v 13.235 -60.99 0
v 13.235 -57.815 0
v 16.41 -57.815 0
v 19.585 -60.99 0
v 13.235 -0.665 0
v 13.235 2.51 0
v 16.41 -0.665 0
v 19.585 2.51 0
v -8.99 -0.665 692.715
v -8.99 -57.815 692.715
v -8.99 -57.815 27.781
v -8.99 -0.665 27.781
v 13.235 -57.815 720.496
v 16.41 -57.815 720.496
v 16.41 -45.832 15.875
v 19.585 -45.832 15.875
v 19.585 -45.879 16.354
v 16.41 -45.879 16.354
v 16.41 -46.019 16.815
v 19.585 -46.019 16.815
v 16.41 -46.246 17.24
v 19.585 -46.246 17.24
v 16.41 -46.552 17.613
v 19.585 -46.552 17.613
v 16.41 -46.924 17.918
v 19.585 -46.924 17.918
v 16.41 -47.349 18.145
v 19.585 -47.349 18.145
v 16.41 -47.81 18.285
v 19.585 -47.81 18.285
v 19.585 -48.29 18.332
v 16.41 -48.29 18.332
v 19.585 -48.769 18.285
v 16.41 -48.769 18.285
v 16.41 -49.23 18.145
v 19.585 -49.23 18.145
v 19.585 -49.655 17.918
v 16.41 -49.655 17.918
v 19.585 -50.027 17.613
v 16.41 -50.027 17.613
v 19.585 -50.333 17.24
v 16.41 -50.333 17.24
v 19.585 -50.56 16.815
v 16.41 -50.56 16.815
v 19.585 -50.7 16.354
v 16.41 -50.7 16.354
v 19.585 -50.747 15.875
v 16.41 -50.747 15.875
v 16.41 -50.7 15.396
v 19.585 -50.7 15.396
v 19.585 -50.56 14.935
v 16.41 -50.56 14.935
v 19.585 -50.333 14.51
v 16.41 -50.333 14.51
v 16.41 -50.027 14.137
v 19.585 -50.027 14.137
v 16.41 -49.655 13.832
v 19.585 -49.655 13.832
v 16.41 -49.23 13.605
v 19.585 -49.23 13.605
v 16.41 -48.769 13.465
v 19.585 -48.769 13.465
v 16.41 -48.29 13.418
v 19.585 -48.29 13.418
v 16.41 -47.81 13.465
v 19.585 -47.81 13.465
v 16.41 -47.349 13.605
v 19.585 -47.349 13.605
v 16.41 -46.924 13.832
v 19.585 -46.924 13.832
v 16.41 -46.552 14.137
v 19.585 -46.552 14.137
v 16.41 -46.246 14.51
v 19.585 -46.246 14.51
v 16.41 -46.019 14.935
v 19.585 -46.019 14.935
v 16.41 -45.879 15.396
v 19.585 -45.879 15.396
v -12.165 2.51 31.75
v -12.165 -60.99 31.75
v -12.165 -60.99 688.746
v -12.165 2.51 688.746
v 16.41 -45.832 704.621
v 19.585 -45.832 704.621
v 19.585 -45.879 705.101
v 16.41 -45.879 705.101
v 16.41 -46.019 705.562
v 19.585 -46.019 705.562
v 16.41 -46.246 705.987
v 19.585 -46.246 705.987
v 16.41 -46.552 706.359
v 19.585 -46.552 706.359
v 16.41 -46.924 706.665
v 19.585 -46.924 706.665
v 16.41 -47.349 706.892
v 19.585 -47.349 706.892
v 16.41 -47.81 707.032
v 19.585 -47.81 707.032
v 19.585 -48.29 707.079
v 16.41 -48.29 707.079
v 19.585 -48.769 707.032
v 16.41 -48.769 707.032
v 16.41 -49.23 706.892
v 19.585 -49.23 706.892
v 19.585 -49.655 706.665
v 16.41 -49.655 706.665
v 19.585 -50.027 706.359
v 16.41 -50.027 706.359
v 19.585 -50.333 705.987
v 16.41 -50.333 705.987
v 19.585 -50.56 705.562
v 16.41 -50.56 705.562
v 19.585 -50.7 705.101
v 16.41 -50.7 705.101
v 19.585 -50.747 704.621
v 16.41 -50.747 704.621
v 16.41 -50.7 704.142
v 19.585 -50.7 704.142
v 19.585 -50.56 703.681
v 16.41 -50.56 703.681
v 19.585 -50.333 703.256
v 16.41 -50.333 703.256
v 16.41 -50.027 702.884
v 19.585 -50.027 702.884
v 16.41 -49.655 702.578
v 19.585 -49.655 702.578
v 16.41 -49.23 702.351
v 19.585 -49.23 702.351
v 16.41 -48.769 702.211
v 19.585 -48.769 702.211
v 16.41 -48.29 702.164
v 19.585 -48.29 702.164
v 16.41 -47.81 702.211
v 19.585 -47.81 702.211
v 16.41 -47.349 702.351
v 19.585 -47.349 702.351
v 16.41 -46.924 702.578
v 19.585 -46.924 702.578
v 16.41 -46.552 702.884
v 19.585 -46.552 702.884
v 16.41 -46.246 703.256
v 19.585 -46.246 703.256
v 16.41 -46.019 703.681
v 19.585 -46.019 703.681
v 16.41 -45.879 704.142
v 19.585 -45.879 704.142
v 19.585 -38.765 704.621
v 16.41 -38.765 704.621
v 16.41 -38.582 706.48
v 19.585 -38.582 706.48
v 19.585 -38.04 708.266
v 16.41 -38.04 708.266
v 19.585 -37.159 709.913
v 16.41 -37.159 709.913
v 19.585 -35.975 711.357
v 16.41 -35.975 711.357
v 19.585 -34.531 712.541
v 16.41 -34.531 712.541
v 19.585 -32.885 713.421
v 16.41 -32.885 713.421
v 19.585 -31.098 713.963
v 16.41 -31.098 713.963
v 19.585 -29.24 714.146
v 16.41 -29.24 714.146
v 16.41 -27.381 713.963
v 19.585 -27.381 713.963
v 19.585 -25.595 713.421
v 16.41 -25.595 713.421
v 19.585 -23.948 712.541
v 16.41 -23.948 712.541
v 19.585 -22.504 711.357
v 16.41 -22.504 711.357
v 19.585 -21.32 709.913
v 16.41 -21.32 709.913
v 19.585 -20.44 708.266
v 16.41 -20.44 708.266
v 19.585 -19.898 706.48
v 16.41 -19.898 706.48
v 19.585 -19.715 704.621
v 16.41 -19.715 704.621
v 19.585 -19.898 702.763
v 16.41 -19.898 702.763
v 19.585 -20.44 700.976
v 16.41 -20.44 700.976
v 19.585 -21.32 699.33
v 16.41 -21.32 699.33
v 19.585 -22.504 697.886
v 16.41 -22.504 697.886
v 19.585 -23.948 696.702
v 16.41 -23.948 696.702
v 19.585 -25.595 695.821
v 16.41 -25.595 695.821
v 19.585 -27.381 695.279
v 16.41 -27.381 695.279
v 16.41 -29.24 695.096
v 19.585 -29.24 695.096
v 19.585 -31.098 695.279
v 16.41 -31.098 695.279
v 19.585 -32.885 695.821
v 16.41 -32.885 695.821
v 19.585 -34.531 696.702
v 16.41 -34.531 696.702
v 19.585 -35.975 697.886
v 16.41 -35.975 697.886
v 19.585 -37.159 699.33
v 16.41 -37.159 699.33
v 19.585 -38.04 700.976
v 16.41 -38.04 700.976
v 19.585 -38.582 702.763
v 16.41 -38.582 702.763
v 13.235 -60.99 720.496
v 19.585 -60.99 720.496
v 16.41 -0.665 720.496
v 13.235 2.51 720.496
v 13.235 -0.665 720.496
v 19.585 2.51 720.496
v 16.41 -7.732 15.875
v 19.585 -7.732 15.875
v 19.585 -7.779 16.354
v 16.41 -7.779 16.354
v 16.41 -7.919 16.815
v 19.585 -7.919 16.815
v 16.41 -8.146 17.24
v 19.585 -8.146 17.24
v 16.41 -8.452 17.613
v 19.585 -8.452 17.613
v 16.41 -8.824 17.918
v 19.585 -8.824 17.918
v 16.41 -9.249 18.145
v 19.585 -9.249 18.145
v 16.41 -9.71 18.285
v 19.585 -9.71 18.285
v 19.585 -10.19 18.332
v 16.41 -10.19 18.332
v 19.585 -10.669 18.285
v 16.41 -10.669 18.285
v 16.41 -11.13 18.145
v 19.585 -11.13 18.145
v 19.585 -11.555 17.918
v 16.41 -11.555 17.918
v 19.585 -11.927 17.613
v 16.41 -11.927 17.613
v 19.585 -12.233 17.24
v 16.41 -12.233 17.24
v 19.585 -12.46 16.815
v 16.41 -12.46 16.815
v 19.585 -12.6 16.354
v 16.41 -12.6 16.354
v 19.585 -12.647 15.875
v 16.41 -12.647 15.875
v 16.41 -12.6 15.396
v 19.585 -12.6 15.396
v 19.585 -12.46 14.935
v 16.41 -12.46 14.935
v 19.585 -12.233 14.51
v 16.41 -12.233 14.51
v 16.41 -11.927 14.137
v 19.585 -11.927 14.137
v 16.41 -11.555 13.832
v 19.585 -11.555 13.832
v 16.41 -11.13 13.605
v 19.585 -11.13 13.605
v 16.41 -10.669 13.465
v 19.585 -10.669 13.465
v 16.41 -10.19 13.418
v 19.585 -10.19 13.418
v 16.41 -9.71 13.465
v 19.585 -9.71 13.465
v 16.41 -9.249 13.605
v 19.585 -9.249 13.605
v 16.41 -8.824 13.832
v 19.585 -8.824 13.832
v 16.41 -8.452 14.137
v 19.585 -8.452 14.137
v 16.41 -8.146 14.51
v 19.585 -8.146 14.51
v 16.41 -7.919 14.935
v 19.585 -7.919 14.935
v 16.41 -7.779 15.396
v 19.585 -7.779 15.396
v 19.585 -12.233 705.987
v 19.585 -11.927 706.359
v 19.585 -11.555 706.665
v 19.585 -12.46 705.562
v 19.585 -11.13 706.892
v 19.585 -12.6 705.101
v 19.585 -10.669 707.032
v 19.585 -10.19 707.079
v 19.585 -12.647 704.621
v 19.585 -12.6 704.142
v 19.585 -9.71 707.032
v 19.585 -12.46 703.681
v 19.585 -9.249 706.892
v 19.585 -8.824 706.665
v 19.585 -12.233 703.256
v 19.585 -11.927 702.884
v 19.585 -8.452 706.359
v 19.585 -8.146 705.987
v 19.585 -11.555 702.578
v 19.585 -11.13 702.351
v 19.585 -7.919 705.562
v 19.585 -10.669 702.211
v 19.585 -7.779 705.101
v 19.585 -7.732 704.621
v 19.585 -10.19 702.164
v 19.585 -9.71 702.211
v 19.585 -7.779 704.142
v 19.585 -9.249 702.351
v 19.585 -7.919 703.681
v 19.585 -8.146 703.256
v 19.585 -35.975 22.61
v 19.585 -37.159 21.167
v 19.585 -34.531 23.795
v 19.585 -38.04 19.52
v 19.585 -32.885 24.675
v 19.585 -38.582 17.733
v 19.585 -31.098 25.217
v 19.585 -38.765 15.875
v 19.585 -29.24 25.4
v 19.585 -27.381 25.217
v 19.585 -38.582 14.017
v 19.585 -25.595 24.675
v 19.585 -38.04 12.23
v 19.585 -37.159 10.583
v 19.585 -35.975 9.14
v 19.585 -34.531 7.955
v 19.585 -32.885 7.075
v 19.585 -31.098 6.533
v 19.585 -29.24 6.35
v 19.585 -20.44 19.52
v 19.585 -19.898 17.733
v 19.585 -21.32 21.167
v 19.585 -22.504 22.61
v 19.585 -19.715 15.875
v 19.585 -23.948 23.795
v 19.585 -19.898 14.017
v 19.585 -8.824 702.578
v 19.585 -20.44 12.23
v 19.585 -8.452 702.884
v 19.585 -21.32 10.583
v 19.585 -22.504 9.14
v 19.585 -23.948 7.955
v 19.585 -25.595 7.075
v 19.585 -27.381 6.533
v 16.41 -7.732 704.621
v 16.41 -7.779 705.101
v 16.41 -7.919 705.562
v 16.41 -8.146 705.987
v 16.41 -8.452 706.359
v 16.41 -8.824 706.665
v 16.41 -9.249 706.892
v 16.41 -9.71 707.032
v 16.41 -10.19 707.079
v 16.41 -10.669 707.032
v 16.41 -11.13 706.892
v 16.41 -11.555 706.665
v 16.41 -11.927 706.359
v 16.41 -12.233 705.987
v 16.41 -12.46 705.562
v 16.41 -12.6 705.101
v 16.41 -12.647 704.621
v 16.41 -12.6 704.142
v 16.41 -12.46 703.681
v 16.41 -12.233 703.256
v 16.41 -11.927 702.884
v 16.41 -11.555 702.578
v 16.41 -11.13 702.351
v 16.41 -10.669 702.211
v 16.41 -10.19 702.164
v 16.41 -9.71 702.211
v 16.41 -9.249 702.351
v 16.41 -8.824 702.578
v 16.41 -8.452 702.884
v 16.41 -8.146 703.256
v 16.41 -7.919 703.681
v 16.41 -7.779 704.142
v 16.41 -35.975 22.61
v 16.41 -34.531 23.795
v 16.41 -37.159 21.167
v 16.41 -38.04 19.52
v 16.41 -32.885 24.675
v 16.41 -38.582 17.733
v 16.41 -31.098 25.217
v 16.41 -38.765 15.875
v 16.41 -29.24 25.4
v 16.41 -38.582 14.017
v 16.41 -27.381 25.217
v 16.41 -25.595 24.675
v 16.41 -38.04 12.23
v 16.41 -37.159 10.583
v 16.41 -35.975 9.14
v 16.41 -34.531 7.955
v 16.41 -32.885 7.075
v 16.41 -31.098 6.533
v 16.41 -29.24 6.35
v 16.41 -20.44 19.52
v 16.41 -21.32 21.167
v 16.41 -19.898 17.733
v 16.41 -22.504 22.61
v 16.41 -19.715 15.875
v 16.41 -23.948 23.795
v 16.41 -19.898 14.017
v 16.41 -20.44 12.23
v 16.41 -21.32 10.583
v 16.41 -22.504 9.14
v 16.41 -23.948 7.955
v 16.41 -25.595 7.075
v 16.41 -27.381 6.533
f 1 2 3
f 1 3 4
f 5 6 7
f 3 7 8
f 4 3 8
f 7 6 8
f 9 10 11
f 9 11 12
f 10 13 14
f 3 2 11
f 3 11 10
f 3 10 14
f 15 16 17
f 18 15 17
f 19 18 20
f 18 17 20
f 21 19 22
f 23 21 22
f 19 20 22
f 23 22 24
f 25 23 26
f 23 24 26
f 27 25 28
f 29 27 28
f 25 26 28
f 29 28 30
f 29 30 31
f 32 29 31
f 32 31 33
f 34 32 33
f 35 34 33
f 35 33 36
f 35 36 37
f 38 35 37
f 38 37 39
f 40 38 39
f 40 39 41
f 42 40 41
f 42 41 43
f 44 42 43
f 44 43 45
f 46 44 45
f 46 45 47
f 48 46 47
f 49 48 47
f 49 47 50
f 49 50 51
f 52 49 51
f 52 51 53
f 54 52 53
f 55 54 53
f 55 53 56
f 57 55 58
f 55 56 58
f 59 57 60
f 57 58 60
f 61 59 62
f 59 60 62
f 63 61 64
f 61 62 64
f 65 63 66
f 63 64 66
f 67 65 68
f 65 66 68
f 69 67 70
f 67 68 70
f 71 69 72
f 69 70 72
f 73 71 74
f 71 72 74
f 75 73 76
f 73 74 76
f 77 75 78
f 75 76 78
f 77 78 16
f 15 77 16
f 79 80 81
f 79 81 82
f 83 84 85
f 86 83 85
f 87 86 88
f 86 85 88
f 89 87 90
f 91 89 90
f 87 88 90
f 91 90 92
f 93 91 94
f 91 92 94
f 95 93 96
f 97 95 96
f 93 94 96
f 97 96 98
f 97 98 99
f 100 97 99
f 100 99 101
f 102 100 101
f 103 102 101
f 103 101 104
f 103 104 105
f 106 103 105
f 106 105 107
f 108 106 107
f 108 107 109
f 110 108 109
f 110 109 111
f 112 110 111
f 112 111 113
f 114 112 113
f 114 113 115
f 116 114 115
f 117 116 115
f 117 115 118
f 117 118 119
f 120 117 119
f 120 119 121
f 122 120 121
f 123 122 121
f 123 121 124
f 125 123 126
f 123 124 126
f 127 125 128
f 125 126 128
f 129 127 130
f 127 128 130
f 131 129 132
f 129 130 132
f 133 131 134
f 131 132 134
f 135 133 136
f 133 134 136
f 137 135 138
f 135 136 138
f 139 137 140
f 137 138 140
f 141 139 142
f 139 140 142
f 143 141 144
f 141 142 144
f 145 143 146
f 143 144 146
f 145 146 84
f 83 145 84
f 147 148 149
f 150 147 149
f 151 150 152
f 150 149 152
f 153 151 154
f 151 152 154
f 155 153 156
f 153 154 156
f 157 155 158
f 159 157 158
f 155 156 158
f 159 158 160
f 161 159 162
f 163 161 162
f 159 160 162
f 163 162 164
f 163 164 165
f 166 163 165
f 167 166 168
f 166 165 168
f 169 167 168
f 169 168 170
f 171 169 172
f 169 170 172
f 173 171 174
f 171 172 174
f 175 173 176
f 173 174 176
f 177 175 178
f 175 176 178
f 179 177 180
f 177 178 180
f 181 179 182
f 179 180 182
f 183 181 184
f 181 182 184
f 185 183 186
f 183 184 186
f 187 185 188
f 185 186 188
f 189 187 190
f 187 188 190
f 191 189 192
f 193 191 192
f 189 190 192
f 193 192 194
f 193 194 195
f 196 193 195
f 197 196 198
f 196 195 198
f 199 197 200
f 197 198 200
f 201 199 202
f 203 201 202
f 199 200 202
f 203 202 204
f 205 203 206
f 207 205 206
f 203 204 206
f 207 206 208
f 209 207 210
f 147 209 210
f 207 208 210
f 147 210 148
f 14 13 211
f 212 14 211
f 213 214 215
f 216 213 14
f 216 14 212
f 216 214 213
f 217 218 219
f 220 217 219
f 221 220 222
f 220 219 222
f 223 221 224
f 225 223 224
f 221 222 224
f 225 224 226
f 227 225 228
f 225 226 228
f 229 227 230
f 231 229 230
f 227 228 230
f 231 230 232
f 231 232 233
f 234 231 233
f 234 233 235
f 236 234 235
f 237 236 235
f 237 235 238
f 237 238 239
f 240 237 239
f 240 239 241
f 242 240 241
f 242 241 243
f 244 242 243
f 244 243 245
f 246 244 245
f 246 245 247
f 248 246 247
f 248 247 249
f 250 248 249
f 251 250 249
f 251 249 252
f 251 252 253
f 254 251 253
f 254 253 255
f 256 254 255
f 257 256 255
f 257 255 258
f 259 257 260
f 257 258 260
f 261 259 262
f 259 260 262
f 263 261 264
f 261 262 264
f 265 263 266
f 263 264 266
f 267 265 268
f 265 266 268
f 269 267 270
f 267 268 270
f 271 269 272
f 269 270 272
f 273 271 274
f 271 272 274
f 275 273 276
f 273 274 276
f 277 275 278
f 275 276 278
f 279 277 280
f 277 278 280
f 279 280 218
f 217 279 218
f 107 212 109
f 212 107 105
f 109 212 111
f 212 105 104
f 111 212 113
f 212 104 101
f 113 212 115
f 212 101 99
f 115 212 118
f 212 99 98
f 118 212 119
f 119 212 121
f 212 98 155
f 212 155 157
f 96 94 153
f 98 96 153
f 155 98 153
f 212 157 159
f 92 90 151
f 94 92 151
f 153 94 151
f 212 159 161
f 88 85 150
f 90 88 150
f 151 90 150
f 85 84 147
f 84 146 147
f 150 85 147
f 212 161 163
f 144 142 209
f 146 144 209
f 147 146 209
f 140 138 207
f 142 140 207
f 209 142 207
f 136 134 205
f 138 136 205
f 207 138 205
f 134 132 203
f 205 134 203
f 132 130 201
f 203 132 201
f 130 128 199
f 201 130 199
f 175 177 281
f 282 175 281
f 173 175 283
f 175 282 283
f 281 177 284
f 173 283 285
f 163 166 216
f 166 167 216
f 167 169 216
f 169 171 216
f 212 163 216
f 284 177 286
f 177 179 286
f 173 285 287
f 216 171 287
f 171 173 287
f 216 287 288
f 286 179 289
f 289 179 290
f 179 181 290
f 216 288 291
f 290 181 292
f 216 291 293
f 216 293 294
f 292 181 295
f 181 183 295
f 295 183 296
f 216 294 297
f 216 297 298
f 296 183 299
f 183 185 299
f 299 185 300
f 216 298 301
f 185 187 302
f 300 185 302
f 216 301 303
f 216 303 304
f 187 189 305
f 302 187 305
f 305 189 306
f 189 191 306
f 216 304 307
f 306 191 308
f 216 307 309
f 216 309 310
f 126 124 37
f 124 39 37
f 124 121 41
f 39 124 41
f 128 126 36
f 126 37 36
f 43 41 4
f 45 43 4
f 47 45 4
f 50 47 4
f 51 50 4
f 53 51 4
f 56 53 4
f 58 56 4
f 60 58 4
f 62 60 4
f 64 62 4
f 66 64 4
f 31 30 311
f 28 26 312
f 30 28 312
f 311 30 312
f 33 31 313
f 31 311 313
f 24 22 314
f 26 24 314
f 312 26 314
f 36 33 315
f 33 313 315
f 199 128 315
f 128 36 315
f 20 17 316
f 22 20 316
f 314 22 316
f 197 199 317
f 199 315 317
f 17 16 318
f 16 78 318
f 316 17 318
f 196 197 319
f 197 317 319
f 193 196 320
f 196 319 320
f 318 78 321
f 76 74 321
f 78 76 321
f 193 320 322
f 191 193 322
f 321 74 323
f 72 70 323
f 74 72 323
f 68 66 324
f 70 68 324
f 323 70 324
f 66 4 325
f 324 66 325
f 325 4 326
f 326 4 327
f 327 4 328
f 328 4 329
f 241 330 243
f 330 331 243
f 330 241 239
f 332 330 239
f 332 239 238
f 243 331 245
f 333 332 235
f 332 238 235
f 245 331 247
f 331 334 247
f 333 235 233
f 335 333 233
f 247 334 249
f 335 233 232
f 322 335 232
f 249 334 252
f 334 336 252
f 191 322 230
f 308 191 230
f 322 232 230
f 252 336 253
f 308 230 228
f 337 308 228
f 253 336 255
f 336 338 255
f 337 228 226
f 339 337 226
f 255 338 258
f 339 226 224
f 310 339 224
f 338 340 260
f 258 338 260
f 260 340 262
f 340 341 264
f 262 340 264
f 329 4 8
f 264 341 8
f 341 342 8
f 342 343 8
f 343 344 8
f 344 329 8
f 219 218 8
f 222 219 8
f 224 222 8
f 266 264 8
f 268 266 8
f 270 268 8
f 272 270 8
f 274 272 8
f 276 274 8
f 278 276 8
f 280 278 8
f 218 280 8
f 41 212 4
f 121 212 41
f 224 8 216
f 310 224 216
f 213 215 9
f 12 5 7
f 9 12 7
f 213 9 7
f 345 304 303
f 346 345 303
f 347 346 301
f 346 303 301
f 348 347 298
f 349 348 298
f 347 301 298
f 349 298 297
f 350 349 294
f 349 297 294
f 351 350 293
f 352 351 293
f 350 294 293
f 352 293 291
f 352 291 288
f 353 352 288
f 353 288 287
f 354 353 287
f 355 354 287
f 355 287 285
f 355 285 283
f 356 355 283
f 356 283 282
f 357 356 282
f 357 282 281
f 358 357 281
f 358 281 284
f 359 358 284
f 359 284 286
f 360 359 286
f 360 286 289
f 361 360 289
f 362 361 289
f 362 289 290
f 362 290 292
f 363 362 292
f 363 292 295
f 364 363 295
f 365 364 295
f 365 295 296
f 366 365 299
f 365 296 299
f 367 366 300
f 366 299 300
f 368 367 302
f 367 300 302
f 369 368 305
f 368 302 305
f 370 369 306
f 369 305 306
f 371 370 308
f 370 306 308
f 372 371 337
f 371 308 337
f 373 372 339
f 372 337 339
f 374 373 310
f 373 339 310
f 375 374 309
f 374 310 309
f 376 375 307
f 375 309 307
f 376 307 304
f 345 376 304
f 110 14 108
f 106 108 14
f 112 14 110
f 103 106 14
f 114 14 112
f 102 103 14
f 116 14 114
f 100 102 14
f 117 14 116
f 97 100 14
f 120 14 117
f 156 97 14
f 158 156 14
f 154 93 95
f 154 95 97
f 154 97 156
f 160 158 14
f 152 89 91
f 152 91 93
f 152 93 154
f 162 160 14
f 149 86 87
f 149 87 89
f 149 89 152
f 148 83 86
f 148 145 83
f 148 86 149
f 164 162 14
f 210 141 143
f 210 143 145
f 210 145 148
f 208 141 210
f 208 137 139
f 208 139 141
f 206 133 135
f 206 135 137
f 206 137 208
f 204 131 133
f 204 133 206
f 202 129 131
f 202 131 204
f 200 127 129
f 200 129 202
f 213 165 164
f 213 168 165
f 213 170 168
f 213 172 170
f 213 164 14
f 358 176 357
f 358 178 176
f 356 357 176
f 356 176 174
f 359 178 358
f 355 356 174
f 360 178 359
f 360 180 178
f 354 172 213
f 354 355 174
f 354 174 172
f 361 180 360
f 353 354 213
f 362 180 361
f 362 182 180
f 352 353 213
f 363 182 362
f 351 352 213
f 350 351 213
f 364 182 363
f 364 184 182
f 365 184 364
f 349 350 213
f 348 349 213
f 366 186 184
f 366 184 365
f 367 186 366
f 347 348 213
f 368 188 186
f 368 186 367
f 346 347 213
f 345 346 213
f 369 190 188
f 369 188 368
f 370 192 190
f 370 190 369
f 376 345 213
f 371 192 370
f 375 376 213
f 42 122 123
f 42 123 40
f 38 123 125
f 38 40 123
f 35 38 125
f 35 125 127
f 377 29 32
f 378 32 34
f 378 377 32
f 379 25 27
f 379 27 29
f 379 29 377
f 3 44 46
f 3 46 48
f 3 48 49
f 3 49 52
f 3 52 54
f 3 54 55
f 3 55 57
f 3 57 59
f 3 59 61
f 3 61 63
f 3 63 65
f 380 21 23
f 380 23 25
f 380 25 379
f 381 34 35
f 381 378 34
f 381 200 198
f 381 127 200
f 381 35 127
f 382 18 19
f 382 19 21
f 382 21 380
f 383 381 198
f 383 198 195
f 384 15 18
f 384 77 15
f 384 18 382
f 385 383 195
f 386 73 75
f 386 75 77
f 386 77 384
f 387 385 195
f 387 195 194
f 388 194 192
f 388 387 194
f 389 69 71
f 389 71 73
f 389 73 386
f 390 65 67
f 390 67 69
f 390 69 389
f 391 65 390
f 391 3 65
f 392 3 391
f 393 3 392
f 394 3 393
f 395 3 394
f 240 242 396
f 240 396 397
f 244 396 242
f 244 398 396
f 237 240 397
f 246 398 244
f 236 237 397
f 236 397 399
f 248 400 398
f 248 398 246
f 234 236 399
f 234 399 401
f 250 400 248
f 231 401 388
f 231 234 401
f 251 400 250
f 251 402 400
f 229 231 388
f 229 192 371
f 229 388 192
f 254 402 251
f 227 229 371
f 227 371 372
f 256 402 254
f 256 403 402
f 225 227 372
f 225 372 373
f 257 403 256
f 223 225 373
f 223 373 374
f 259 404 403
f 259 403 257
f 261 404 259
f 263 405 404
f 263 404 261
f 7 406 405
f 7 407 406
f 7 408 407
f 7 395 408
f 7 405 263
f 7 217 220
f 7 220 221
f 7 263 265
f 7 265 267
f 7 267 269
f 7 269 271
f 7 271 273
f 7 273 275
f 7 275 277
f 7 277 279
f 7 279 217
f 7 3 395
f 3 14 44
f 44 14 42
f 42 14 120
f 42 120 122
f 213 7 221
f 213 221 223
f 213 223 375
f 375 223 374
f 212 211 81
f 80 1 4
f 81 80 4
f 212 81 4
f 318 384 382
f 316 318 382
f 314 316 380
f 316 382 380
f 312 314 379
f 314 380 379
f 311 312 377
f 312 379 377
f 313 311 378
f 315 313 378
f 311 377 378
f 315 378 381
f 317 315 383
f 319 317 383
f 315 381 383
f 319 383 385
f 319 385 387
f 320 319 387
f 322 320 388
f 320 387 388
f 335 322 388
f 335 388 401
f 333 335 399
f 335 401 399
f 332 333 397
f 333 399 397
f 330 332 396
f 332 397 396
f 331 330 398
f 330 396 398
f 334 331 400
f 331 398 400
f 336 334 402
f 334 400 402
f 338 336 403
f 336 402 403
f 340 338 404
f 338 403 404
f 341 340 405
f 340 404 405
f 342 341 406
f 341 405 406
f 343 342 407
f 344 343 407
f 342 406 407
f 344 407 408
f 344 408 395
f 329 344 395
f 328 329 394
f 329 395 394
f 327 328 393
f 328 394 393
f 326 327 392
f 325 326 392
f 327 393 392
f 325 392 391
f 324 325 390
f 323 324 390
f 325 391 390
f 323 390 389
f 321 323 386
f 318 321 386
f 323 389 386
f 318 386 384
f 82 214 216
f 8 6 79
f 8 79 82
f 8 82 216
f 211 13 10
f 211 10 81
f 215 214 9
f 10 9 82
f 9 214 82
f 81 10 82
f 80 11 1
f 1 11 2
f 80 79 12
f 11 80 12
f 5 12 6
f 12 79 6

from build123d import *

# Parameters (mm, degrees)
SKETCH1_W                    = 31.75
SKETCH1_H                    = 63.5
SKETCH1_W_2                  = 25.4
SKETCH1_H_2                  = 57.15
BOSS_EXTRUDE1_DEPTH          = 720.4964
CUT_EXTRUDE1_REACH           = 725.554
F_10_0_1935_DIAMETER_HOLE1_D = 4.9149
SKETCH3_R                    = 9.525
CUT_EXTRUDE2_DEPTH           = 3.175


with BuildPart() as part:
    # Sketch1 → Boss-Extrude1 (new body)
    with BuildSketch(Plane.XY):
        with Locations((3.710272719, -29.23968021)):
            Rectangle(SKETCH1_W, SKETCH1_H)
        with Locations((3.710272719, -29.23968021)):
            Rectangle(SKETCH1_W_2, SKETCH1_H_2, mode=Mode.SUBTRACT)
    extrude(amount=BOSS_EXTRUDE1_DEPTH)

    # Cut-Extrude1: up to this face of the body (flat: up to its plane)
    cut_extrude1_end = Plane(part.part.faces().sort_by_distance((3.710272719, -60.98968021, 360.2482))[0])
    # Sketch2 → Cut-Extrude1 (cut, up to the picked face)
    with BuildSketch(Plane(origin=(0, 2.51031979, 0), x_dir=(1, 0, 0), z_dir=(0, 1, 0)), mode=Mode.PRIVATE) as cut_extrude1_sk1:
        Polygon((-12.164727281, -31.75), (13.235272719, 0), (-12.164727281, 0), align=None)
    cut_extrude1_tool1 = split(extrude(cut_extrude1_sk1.sketch, amount=-CUT_EXTRUDE1_REACH, mode=Mode.PRIVATE), bisect_by=cut_extrude1_end, keep=Keep.BOTH, mode=Mode.PRIVATE)
    # Sketch2 → Cut-Extrude1 (cut, up to the picked face)
    with BuildSketch(Plane(origin=(0, 2.51031979, 0), x_dir=(1, 0, 0), z_dir=(0, 1, 0)), mode=Mode.PRIVATE) as cut_extrude1_sk2:
        Polygon((13.235272719, -720.4964), (-12.164727281, -688.7464), (-12.164727281, -720.4964), align=None)
    cut_extrude1_tool2 = split(extrude(cut_extrude1_sk2.sketch, amount=-CUT_EXTRUDE1_REACH, mode=Mode.PRIVATE), bisect_by=cut_extrude1_end, keep=Keep.BOTH, mode=Mode.PRIVATE)
    add(cut_extrude1_tool1.solids().sort_by(Axis((-3.698061, 2.51032, 10.583333), (0, -1, 0)))[0], mode=Mode.SUBTRACT)
    add(cut_extrude1_tool2.solids().sort_by(Axis((-3.698061, 2.51032, 709.913067), (0, -1, 0)))[0], mode=Mode.SUBTRACT)

    # #10 (0.1935) Diameter Hole1 (through all)
    with Locations(Plane(origin=(16.410272719, -10.18968021, 15.875), x_dir=(0, -1, 0), z_dir=(-1, 0, 0))):
        with Locations((0, 0), (38.1, 0), (0, 688.7464), (38.1, 688.7464)):
            Hole(F_10_0_1935_DIAMETER_HOLE1_D / 2)

    # Sketch3 → Cut-Extrude2 (cut)
    with BuildSketch(Plane.ZY.offset(-16.410272719)):
        with Locations(Location((15.875, -29.23968021, 0), (0, 0, 270))):
            Circle(SKETCH3_R)
        with Locations(Location((704.6214, -29.23968021, 0), (0, 0, 270))):
            Circle(SKETCH3_R)
    extrude(amount=-CUT_EXTRUDE2_DEPTH, mode=Mode.SUBTRACT)


solid = part.part
